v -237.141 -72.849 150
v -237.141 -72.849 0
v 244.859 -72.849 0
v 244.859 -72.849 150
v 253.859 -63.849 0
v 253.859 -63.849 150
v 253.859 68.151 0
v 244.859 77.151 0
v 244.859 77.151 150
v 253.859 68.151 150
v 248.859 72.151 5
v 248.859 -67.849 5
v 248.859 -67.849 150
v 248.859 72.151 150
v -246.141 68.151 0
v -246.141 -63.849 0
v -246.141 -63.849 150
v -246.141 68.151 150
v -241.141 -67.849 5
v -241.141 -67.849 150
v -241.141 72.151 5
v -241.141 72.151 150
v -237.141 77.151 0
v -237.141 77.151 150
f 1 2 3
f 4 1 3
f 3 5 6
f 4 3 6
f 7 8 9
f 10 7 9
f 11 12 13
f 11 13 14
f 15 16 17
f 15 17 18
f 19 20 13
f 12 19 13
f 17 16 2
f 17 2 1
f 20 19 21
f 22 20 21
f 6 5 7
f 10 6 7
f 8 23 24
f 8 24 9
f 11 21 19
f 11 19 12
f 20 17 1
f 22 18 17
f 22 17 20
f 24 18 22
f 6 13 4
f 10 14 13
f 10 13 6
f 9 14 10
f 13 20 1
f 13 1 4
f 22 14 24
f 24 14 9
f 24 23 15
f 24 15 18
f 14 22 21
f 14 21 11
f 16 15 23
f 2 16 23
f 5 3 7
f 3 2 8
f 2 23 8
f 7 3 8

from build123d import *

# Parameters (mm, degrees)
F0_W     = 500
F0_H     = 150
F1_DEPTH = 150
F2_W     = 490
F2_H     = 140
F3_DEPTH = 145
F4_SIZE  = 9
F5_SIZE  = 9


with BuildPart() as f1:
    # F0 (on Top) → F1 (new body)
    with BuildSketch(Plane.XY):
        with Locations((3.85901, 2.15064)):
            Rectangle(F0_W, F0_H)
    extrude(amount=F1_DEPTH)

    # F2 (on face) → F3 (cut)
    with BuildSketch(Plane.XY.offset(150)):
        with Locations((3.85901, 2.15064)):
            Rectangle(F2_W, F2_H)
    extrude(amount=-F3_DEPTH, mode=Mode.SUBTRACT)

    # F4
    f4_edges = [f1.edges().sort_by_distance(p)[0] for p in [
        (253.85901, -72.84936, 75),
    ]]
    chamfer(f4_edges, length=F4_SIZE)

    # F5
    f5_edges = [f1.edges().sort_by_distance(p)[0] for p in [
        (253.85901, 77.15064, 75),
        (-246.14099, 77.15064, 75),
        (-246.14099, -72.84936, 75),
    ]]
    chamfer(f5_edges, length=F5_SIZE)


solid = f1.part
